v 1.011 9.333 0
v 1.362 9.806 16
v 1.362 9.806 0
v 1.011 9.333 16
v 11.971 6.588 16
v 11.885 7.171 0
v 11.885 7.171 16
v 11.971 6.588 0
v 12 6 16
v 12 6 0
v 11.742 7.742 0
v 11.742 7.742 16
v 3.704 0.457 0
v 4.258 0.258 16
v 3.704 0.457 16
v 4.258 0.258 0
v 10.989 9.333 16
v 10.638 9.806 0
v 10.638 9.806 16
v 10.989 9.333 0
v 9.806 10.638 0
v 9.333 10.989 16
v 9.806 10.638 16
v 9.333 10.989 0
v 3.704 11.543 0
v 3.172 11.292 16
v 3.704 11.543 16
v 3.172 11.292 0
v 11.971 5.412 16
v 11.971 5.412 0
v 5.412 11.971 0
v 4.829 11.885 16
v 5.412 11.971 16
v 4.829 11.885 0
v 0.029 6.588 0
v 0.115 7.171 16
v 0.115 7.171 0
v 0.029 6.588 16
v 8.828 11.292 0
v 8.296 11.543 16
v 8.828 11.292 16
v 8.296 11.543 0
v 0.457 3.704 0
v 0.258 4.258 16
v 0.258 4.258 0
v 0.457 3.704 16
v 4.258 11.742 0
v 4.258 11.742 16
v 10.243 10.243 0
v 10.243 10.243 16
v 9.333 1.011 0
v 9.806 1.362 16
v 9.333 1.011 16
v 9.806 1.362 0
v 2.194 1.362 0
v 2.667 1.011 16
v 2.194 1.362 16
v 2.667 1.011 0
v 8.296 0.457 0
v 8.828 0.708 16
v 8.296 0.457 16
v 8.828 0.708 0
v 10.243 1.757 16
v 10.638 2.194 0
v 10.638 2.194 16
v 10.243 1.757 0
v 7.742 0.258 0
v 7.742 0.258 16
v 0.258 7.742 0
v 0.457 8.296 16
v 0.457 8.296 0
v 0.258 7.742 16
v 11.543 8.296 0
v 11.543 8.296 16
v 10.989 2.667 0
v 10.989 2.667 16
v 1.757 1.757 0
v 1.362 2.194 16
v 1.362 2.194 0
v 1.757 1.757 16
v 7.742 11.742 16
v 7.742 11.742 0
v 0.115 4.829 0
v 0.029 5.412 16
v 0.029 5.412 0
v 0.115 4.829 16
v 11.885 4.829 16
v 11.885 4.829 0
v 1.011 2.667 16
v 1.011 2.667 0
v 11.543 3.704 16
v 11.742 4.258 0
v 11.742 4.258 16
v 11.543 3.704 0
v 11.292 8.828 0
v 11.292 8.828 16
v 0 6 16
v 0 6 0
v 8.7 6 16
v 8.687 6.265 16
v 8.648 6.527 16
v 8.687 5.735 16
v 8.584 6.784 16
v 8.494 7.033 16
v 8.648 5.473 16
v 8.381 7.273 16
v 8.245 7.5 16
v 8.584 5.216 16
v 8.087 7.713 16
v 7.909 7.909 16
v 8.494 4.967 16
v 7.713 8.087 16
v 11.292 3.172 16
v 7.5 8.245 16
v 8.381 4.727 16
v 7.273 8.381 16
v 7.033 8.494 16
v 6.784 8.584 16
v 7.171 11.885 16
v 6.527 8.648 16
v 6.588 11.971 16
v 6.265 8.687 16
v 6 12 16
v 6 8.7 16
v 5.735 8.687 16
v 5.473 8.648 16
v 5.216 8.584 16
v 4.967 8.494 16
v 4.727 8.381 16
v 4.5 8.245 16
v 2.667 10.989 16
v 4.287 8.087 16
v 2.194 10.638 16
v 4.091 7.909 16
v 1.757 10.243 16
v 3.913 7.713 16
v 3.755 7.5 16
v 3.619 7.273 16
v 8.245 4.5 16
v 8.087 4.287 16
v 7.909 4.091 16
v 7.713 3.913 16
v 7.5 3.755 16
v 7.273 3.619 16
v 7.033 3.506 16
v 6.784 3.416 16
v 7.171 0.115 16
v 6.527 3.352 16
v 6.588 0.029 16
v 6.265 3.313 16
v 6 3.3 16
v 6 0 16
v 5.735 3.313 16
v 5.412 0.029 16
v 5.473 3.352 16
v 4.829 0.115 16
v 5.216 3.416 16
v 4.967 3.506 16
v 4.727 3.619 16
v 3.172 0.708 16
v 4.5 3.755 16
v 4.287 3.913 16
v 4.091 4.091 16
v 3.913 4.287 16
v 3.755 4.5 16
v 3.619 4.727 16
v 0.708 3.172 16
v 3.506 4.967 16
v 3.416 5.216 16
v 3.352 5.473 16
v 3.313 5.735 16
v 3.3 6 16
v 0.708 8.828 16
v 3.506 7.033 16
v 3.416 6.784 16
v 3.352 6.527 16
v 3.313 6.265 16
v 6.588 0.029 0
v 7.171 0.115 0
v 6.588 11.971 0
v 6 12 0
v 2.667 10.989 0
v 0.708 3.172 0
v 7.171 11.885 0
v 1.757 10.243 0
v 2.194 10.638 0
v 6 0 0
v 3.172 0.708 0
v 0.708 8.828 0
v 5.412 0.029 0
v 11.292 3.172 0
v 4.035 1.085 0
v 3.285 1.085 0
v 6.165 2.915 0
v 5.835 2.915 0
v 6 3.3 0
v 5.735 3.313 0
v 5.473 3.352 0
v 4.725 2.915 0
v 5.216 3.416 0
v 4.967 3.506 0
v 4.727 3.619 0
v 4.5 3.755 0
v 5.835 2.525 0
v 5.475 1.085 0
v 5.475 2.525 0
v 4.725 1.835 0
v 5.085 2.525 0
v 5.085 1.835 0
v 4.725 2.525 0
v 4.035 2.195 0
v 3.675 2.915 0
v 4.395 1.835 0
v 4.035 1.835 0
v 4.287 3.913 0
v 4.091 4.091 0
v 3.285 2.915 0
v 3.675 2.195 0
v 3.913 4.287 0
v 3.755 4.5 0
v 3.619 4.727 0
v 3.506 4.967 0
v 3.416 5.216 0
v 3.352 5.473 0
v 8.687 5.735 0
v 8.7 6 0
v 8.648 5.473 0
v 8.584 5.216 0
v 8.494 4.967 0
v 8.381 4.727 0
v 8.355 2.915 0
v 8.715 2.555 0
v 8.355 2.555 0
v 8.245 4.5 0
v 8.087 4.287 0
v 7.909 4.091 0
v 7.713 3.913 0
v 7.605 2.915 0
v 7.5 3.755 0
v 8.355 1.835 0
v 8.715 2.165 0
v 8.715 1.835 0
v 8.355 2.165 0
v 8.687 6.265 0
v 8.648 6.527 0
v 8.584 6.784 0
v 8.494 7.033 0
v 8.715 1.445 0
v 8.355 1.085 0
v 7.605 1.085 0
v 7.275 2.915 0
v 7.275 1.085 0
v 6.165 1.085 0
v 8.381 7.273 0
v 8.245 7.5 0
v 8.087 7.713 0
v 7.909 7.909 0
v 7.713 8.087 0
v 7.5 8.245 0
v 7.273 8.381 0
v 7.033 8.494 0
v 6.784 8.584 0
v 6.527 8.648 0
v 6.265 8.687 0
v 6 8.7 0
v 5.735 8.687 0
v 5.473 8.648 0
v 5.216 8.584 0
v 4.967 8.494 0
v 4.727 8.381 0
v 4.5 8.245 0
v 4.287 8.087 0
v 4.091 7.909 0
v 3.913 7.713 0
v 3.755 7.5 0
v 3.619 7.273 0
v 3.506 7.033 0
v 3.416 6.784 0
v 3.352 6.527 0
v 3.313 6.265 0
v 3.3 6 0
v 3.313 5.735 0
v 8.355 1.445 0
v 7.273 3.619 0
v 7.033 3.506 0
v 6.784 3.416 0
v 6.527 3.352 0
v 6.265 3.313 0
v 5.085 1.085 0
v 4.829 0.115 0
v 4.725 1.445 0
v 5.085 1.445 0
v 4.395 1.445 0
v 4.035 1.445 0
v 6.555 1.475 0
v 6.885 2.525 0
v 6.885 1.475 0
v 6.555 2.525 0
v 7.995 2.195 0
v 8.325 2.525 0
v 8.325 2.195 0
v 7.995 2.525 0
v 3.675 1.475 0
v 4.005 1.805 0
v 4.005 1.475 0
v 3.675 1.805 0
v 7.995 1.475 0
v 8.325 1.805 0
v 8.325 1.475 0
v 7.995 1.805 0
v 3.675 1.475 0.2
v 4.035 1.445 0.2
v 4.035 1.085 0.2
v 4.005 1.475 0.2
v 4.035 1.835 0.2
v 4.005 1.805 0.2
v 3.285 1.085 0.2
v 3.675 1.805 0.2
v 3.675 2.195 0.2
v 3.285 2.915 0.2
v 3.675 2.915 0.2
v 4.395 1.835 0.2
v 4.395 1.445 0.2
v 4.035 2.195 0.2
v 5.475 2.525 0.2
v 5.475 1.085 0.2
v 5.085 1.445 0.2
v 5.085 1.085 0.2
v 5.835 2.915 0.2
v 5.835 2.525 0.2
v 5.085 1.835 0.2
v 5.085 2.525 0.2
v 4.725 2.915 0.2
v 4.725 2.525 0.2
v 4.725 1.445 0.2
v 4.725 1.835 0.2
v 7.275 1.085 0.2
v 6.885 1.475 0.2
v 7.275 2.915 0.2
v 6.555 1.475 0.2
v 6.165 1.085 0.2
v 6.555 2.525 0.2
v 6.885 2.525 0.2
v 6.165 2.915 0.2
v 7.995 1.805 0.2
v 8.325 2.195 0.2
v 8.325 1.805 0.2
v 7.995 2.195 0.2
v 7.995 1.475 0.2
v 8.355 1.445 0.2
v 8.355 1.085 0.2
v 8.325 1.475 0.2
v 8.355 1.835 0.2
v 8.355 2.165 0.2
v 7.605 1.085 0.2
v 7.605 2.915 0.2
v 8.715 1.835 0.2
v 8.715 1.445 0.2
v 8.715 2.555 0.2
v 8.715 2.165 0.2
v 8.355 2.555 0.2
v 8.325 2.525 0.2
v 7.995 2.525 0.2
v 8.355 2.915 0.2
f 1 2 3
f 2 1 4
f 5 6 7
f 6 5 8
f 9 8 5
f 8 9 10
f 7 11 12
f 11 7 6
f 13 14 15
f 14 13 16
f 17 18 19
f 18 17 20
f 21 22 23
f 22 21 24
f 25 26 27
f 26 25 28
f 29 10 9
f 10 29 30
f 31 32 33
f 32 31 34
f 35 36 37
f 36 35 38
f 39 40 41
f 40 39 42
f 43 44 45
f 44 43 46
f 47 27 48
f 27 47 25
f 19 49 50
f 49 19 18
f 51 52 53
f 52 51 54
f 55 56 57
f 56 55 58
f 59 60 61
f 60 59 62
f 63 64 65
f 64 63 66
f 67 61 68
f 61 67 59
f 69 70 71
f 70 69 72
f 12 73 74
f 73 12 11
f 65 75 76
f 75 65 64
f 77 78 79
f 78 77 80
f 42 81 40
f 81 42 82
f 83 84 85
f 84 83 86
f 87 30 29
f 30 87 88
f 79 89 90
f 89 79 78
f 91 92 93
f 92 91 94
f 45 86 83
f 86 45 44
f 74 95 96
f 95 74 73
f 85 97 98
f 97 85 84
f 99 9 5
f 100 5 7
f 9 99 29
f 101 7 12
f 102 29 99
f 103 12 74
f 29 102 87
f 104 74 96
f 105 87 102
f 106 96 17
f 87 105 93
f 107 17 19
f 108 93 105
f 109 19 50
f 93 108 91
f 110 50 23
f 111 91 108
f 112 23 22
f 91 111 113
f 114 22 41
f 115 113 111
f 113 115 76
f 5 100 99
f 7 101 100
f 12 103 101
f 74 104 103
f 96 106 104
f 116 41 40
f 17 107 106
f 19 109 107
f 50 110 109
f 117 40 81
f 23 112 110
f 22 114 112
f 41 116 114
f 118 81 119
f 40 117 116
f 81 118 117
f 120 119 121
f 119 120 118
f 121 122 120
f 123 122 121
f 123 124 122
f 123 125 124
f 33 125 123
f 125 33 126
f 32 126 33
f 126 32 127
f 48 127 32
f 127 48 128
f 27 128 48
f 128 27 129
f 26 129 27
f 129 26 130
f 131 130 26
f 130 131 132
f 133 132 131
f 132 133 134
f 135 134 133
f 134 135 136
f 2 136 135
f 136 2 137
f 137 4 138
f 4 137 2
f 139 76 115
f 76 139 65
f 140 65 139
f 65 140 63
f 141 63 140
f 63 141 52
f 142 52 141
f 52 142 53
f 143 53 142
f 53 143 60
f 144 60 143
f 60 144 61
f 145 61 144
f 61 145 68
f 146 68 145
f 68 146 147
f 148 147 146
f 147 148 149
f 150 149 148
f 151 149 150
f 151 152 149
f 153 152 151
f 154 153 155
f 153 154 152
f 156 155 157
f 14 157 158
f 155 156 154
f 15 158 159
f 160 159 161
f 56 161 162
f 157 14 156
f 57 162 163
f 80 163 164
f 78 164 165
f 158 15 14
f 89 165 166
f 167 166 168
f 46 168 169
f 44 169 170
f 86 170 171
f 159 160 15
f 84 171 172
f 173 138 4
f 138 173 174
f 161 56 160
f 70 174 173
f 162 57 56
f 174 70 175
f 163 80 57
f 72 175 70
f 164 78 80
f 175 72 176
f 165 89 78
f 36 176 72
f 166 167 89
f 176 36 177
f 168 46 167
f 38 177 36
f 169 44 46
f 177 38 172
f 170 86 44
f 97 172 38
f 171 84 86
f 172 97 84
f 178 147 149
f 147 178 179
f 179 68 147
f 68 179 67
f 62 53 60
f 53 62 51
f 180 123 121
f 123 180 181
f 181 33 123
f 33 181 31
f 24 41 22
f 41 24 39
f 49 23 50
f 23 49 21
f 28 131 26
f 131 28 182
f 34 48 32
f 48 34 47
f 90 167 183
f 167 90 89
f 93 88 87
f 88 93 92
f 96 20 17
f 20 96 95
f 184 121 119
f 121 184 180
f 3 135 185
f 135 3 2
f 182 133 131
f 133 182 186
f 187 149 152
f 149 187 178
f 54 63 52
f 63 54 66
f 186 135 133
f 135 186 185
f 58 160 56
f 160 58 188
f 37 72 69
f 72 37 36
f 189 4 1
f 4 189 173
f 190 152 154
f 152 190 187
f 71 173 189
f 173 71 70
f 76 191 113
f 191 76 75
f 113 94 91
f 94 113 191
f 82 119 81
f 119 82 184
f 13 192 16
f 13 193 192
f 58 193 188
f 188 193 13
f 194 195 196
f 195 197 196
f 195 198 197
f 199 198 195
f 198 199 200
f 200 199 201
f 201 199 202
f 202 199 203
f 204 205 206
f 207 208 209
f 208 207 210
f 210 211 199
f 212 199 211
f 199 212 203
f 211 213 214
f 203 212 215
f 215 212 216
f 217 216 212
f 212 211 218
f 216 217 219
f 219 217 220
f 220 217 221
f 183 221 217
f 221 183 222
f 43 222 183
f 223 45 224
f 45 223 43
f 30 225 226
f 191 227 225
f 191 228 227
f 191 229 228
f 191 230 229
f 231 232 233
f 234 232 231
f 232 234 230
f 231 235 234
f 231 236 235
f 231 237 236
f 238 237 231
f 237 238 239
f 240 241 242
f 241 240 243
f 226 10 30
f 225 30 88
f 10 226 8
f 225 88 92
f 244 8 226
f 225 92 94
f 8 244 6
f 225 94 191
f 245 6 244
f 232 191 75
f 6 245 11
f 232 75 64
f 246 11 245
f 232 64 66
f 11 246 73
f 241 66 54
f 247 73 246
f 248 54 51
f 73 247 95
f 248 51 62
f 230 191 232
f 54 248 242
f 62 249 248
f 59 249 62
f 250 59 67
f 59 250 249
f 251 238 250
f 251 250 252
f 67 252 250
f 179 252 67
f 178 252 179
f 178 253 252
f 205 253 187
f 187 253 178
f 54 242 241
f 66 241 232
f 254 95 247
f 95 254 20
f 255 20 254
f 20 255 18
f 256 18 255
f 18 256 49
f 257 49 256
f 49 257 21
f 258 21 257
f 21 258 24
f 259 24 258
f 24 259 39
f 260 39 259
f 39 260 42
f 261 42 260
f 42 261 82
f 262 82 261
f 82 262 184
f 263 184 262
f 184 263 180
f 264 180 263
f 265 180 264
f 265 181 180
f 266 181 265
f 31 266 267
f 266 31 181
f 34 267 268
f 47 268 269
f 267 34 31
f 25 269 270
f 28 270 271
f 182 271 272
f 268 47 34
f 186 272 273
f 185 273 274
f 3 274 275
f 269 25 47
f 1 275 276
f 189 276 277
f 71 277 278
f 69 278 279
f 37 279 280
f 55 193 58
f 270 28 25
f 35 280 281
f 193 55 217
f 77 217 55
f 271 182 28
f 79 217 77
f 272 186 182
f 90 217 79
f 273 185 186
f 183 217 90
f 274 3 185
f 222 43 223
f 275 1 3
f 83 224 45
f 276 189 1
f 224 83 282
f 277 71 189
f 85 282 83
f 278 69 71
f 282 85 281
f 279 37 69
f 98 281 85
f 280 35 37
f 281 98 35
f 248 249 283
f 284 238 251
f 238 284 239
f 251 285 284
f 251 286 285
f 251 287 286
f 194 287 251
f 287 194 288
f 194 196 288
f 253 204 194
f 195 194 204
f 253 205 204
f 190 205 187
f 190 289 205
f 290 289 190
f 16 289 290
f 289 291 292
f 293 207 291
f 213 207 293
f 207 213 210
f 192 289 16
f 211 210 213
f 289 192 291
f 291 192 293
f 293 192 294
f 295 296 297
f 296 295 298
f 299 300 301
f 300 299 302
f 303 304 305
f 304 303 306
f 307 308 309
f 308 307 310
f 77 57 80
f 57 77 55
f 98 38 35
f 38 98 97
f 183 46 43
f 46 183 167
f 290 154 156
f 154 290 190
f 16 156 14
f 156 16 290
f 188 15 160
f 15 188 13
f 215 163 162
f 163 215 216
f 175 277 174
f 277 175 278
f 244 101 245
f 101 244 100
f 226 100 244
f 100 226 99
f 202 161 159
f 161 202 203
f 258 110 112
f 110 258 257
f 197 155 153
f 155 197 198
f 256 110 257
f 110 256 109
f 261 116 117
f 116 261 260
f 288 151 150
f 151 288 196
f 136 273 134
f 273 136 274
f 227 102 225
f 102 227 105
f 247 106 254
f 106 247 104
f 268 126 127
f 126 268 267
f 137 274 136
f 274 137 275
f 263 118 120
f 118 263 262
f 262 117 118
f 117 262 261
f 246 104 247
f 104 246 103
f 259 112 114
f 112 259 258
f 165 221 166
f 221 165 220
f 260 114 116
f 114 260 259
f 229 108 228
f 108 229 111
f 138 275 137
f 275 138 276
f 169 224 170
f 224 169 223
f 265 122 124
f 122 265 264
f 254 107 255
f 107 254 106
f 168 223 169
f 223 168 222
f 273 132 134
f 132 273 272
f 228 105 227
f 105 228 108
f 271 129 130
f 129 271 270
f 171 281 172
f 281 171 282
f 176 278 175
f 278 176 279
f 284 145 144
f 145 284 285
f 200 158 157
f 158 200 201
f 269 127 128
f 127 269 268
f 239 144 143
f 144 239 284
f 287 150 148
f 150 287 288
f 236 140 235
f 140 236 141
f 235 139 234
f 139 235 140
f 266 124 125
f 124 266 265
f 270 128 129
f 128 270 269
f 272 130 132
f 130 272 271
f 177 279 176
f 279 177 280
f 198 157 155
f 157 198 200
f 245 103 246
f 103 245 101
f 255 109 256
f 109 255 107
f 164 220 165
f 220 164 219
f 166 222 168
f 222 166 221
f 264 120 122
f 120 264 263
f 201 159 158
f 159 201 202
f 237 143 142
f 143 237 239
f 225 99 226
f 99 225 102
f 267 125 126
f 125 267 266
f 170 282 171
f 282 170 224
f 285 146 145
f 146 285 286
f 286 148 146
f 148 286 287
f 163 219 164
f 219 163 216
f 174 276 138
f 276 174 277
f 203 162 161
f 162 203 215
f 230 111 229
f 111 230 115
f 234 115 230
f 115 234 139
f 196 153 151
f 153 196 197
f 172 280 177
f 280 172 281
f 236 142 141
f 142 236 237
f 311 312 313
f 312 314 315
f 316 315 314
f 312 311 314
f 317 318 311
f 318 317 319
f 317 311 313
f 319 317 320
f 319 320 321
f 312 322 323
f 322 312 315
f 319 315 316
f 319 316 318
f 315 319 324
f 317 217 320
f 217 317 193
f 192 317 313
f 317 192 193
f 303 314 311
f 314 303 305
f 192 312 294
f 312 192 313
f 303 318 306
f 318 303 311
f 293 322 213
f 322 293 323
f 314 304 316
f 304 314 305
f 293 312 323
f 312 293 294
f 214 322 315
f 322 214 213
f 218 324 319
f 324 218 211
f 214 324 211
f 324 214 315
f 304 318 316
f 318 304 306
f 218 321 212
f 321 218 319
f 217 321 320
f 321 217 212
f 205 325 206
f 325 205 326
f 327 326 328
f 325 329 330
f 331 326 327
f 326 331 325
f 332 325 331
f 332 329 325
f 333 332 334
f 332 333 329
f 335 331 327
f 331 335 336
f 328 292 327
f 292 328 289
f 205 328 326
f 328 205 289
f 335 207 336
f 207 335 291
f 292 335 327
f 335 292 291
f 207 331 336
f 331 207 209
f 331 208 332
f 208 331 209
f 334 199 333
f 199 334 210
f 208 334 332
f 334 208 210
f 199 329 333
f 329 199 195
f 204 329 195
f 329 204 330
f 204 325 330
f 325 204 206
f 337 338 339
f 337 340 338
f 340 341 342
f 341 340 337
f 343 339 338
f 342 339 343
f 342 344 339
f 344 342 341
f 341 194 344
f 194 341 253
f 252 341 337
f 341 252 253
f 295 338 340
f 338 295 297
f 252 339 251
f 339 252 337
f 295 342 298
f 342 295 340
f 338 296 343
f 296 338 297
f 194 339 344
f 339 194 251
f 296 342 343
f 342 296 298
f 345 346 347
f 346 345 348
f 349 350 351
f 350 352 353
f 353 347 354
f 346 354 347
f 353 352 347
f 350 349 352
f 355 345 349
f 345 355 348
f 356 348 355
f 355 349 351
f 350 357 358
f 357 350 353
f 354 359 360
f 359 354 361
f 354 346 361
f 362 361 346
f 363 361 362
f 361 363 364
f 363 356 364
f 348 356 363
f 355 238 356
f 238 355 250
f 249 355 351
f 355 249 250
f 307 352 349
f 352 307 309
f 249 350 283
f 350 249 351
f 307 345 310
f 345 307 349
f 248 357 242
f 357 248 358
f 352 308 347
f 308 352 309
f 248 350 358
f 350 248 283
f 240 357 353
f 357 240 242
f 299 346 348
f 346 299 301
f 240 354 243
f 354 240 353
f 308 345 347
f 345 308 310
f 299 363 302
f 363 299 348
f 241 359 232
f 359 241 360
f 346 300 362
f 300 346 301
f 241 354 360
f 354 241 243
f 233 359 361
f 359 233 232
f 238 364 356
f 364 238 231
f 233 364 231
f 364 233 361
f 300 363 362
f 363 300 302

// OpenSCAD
// 自由壓牌輪
$fn=64;
translate([6,-60.83504,-0]){rotate([90,0,0]){difference(){difference(){translate([0,0,-66.83504]){rotate([-90,0,0]){translate([0,0,0]){cylinder(h=16,d1=12,d2=12,$fn=64);}}}translate([0,-1,-66.83504]){rotate([-90,0,0]){translate([0,0,0]){cylinder(h=18,d1=5.4,d2=5.4,$fn=64);}}}}multmatrix([[1,0,0,0],[0,0,-1,0],[0,1,0,-62.83504],[0,0,0,1]]){union(){union(){union(){union(){union(){union(){union(){union(){union(){union(){union(){union(){union(){union(){union(){union(){union(){union(){union(){union(){union(){union(){union(){union(){union(){union(){union(){union(){union(){union(){union(){union(){union(){union(){union(){union(){union(){translate([-2.715,0.525,-0.2]){cube([0.39,0.39,0.32]);}translate([-2.355,0.525,-0.2]){cube([0.39,0.39,0.32]);}}translate([-2.715,0.165,-0.2]){cube([0.39,0.39,0.32]);}}translate([-1.995,0.165,-0.2]){cube([0.39,0.39,0.32]);}}translate([-2.715,-0.195,-0.2]){cube([0.39,0.39,0.32]);}}translate([-2.355,-0.195,-0.2]){cube([0.39,0.39,0.32]);}}translate([-2.715,-0.555,-0.2]){cube([0.39,0.39,0.32]);}}translate([-2.715,-0.915,-0.2]){cube([0.39,0.39,0.32]);}}translate([-0.915,0.525,-0.2]){cube([0.39,0.39,0.32]);}}translate([-1.275,0.165,-0.2]){cube([0.39,0.39,0.32]);}}translate([-0.915,0.165,-0.2]){cube([0.39,0.39,0.32]);}}translate([-0.915,-0.195,-0.2]){cube([0.39,0.39,0.32]);}}translate([-0.915,-0.555,-0.2]){cube([0.39,0.39,0.32]);}}translate([-1.275,-0.915,-0.2]){cube([0.39,0.39,0.32]);}}translate([-0.915,-0.915,-0.2]){cube([0.39,0.39,0.32]);}}translate([-0.555,-0.915,-0.2]){cube([0.39,0.39,0.32]);}}translate([0.165,0.525,-0.2]){cube([0.39,0.39,0.32]);}}translate([0.525,0.525,-0.2]){cube([0.39,0.39,0.32]);}}translate([0.885,0.525,-0.2]){cube([0.39,0.39,0.32]);}}translate([0.165,0.165,-0.2]){cube([0.39,0.39,0.32]);}}translate([0.885,0.165,-0.2]){cube([0.39,0.39,0.32]);}}translate([0.165,-0.195,-0.2]){cube([0.39,0.39,0.32]);}}translate([0.885,-0.195,-0.2]){cube([0.39,0.39,0.32]);}}translate([0.165,-0.555,-0.2]){cube([0.39,0.39,0.32]);}}translate([0.885,-0.555,-0.2]){cube([0.39,0.39,0.32]);}}translate([0.165,-0.915,-0.2]){cube([0.39,0.39,0.32]);}}translate([0.525,-0.915,-0.2]){cube([0.39,0.39,0.32]);}}translate([0.885,-0.915,-0.2]){cube([0.39,0.39,0.32]);}}translate([1.605,0.525,-0.2]){cube([0.39,0.39,0.32]);}}translate([1.965,0.525,-0.2]){cube([0.39,0.39,0.32]);}}translate([1.605,0.165,-0.2]){cube([0.39,0.39,0.32]);}}translate([2.325,0.165,-0.2]){cube([0.39,0.39,0.32]);}}translate([1.605,-0.195,-0.2]){cube([0.39,0.39,0.32]);}}translate([1.965,-0.195,-0.2]){cube([0.39,0.39,0.32]);}}translate([1.605,-0.555,-0.2]){cube([0.39,0.39,0.32]);}}translate([2.325,-0.555,-0.2]){cube([0.39,0.39,0.32]);}}translate([1.605,-0.915,-0.2]){cube([0.39,0.39,0.32]);}}translate([1.965,-0.915,-0.2]){cube([0.39,0.39,0.32]);}}}}}}
